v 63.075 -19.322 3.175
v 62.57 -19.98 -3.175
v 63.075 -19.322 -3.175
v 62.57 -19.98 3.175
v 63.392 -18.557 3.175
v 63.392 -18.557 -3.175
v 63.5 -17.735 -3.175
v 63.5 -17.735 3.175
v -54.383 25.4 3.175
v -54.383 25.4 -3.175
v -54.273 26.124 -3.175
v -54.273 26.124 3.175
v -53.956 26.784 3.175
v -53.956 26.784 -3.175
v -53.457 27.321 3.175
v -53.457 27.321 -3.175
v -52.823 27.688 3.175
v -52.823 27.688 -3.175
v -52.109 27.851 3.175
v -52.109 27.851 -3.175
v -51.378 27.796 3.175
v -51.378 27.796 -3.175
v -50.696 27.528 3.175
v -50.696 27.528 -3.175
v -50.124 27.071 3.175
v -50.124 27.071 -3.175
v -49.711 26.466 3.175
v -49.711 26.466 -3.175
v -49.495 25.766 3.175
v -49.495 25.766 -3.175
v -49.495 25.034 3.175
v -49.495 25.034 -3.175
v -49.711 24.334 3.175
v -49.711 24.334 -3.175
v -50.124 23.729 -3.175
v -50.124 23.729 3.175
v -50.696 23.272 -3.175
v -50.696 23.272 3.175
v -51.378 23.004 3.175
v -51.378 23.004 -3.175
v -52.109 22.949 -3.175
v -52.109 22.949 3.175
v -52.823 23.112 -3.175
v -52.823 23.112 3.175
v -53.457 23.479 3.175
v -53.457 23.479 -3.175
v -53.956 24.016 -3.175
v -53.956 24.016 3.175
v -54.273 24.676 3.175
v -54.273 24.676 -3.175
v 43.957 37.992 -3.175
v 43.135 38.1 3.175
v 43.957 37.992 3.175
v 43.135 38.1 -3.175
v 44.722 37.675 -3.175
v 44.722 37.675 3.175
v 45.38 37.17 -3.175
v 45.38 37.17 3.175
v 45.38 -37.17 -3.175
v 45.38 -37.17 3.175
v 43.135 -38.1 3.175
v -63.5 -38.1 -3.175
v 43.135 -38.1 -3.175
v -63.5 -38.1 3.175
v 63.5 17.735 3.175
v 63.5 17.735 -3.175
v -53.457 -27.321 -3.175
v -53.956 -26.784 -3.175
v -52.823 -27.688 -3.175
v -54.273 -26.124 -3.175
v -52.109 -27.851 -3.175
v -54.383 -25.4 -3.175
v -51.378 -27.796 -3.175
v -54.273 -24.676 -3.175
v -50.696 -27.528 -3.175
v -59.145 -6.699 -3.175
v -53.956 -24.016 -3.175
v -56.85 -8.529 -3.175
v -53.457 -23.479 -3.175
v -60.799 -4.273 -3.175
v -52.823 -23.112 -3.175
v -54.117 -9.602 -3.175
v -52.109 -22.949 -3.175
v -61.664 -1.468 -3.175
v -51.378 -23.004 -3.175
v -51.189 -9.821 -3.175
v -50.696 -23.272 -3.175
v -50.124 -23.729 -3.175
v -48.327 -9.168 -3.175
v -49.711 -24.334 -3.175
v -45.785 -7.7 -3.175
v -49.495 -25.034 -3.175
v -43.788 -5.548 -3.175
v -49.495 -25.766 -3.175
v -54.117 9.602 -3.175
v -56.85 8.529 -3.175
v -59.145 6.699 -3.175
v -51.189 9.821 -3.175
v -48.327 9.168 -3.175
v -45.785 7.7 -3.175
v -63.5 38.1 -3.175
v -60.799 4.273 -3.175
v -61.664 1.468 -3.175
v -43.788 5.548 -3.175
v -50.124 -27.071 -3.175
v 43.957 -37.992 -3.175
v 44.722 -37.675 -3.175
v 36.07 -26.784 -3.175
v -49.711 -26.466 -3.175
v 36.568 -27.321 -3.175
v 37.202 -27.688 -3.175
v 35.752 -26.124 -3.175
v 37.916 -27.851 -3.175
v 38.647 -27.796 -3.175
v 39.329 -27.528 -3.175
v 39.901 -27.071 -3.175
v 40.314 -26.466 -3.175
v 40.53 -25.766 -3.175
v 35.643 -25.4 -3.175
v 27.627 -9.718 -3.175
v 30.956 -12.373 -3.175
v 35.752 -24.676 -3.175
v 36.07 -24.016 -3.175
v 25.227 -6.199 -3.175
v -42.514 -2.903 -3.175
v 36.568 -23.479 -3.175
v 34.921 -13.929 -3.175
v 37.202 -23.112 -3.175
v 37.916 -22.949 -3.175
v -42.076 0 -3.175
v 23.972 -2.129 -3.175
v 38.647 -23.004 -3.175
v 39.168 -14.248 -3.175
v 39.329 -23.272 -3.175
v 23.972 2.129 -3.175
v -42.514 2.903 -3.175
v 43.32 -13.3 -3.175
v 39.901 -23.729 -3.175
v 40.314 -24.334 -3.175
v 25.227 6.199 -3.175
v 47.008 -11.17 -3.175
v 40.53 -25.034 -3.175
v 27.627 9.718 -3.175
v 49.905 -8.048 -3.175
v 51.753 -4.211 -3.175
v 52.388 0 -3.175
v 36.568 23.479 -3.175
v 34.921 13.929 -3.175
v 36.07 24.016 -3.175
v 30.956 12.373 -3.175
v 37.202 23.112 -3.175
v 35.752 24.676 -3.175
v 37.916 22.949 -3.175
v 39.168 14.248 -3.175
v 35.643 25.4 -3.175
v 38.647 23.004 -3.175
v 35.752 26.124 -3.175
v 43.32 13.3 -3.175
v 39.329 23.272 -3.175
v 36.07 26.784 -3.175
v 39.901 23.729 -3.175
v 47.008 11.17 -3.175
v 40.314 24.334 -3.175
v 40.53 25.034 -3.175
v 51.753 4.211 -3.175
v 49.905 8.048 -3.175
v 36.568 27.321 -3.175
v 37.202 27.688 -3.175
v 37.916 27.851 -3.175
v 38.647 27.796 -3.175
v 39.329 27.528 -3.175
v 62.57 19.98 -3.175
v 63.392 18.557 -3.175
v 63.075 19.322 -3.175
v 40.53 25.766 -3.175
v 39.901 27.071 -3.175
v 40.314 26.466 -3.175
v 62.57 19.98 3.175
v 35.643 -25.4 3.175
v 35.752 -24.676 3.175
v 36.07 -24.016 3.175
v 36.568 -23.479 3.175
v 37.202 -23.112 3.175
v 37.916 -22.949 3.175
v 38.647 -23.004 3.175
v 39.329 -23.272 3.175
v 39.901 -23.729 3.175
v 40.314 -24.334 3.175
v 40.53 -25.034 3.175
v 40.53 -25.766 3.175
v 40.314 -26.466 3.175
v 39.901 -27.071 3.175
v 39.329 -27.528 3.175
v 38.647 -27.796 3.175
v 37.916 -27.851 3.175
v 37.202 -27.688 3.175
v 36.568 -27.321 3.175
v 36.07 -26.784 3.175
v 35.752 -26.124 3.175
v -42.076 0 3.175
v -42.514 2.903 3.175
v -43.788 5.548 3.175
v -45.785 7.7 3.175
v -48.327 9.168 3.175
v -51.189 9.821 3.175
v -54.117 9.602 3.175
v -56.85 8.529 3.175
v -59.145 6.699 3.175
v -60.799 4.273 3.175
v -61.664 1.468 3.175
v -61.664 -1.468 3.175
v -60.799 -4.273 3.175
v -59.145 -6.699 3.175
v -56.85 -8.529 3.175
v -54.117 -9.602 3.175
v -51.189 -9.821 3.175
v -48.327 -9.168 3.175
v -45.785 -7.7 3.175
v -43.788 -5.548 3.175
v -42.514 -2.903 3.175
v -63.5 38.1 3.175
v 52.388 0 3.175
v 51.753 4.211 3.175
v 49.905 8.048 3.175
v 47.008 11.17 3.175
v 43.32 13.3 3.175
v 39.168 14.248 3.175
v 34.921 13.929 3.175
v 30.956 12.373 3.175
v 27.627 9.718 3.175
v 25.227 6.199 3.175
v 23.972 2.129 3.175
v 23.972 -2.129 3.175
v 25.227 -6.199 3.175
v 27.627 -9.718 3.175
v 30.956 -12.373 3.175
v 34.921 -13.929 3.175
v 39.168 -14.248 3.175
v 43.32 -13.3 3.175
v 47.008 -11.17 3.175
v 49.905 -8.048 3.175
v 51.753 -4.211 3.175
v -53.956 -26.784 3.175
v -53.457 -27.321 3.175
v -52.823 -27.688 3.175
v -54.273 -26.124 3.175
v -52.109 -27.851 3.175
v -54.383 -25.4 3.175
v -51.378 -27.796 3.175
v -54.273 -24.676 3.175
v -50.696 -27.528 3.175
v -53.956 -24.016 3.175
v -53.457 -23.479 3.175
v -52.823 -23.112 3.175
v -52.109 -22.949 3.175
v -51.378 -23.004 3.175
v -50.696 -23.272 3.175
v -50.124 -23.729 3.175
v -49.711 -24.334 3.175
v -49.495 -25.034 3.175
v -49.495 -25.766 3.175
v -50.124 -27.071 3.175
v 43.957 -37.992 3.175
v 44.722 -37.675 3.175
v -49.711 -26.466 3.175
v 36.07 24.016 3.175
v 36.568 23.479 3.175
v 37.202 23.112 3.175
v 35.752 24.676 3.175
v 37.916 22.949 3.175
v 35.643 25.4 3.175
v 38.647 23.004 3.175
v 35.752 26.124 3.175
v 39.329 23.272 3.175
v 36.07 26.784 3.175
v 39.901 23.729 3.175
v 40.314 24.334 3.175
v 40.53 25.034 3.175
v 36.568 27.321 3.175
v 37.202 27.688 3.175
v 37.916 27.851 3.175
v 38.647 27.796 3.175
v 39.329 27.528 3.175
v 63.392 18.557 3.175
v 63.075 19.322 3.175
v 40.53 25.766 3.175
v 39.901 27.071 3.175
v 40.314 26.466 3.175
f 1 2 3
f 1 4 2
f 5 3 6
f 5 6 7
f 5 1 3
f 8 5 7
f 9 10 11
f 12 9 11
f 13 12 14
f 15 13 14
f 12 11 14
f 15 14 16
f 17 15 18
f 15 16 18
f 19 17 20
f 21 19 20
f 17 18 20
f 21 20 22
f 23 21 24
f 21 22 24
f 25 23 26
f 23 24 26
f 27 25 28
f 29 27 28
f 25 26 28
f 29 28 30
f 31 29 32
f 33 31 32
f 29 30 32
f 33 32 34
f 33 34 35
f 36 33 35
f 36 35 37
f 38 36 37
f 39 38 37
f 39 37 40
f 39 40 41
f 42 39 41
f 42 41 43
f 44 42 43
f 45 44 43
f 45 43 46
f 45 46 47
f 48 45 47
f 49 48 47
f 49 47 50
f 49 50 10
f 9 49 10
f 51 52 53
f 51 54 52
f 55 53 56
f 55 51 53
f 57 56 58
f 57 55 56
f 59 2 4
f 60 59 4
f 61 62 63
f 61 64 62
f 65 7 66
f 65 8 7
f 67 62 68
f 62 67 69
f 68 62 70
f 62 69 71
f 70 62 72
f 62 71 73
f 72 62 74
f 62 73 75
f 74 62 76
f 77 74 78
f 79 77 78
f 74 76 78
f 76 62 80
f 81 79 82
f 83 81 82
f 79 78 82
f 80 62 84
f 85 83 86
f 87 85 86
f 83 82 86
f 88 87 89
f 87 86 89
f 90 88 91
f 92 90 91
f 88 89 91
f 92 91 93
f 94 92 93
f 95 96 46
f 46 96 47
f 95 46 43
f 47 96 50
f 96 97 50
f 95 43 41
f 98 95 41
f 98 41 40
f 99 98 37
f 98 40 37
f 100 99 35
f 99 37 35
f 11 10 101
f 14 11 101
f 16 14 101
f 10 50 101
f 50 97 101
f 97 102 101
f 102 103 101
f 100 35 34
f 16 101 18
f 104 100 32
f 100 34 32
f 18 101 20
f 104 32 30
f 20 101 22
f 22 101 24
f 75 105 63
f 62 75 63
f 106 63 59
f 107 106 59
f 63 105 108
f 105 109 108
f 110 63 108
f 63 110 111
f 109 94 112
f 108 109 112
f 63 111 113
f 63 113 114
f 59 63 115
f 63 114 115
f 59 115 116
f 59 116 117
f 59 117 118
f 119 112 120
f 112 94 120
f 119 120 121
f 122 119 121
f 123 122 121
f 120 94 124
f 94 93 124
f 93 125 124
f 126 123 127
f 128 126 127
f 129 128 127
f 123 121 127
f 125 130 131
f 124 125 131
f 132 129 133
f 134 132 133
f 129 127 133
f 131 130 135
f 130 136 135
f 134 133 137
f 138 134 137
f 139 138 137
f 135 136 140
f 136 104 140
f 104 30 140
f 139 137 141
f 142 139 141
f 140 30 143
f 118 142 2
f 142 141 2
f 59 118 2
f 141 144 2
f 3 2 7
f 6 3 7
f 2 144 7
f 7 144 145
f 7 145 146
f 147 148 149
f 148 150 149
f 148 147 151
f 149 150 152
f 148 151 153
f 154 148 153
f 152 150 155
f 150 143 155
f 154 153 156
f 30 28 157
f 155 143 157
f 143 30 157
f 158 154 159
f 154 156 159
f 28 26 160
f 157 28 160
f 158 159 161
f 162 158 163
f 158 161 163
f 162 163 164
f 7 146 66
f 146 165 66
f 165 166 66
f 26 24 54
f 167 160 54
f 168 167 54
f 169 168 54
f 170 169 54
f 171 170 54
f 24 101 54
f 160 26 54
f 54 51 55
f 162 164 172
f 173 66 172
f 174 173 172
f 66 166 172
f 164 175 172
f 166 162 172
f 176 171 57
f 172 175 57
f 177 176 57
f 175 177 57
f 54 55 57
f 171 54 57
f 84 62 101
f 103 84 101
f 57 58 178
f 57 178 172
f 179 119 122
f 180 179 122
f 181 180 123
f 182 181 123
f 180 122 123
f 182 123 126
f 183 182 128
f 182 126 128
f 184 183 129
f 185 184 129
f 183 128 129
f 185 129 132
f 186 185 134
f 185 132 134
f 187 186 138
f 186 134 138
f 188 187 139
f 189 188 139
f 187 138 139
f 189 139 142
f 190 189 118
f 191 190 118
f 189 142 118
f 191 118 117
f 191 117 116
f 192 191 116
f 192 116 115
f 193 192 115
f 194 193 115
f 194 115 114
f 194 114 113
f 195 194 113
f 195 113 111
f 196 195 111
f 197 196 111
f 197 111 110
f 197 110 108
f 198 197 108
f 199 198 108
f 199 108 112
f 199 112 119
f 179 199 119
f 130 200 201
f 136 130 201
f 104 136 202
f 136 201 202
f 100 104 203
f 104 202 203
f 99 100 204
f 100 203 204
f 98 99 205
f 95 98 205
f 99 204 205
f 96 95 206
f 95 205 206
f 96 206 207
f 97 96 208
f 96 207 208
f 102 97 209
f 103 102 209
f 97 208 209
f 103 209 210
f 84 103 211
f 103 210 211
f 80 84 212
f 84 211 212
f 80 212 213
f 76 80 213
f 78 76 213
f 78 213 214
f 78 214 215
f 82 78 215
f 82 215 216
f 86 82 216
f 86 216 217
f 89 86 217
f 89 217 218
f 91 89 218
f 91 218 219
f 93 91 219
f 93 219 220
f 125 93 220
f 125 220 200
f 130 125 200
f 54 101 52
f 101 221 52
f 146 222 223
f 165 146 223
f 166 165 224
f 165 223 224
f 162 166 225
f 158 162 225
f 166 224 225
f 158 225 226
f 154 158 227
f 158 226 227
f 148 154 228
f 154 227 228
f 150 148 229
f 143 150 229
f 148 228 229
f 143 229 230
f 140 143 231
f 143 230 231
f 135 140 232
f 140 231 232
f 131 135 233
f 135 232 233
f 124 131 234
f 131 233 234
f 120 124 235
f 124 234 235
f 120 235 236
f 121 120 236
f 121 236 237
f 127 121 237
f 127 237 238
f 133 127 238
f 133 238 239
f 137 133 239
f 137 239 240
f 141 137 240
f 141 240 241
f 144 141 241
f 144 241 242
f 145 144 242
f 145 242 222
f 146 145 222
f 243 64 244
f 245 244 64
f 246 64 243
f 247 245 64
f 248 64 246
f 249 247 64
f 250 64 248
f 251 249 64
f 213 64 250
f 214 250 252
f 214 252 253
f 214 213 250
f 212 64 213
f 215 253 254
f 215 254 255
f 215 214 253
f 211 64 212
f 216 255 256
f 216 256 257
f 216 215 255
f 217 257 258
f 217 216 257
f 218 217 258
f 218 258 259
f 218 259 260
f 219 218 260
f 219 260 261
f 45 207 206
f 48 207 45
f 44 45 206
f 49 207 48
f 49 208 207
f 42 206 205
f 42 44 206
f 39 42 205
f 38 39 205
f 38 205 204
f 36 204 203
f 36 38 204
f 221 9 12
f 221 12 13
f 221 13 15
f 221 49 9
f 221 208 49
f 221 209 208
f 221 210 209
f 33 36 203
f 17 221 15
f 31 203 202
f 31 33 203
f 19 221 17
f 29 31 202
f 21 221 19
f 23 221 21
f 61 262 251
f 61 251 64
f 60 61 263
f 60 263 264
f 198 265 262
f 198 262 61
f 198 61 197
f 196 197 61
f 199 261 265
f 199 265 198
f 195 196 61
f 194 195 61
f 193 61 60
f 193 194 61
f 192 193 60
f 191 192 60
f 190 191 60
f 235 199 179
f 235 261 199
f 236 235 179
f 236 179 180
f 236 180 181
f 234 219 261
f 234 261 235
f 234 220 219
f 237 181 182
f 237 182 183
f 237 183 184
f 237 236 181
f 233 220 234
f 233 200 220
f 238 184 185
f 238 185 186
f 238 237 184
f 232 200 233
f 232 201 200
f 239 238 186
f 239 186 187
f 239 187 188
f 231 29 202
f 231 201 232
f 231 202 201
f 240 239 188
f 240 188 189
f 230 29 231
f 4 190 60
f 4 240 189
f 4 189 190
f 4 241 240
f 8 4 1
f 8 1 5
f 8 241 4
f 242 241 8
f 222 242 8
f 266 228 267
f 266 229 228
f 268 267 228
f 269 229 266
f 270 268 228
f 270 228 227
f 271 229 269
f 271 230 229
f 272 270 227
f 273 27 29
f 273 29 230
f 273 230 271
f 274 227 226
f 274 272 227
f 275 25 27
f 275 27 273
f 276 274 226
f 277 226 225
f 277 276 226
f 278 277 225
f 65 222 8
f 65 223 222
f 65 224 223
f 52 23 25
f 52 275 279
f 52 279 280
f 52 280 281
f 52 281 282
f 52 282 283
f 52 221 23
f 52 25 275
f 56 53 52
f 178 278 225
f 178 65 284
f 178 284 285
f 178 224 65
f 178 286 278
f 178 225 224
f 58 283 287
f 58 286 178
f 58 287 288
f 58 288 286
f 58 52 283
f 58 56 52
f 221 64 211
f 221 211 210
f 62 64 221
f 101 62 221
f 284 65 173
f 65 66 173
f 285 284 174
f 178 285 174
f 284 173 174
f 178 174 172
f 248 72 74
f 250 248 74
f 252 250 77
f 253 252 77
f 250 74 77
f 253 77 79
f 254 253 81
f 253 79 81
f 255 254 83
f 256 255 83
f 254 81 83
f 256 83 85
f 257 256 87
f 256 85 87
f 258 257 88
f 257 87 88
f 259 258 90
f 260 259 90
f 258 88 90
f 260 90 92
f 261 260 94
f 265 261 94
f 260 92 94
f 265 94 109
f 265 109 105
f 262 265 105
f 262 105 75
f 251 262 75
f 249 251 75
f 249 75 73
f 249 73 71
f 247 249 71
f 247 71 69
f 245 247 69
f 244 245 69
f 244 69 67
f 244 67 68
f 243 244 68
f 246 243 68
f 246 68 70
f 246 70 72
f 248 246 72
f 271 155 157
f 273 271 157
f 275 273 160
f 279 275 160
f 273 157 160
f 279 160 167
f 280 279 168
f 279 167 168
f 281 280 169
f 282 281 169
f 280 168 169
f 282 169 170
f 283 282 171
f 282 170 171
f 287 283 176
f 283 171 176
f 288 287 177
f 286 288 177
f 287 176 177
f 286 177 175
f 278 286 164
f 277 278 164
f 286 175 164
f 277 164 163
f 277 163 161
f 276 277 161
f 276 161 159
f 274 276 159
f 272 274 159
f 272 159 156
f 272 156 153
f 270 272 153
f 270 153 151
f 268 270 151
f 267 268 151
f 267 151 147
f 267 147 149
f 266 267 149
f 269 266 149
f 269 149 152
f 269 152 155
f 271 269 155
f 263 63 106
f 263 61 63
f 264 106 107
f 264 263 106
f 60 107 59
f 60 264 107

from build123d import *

# Parameters (mm, degrees)
SKETCH1_W                    = 127
SKETCH1_H                    = 76.2
BOSS_EXTRUDE1_DEPTH          = 3.175
SKETCH2_R                    = 9.84885
SKETCH2_R_2                  = 14.2875
CUT_EXTRUDE1_DEPTH           = 75.324844433
CHAMFER1_SIZE                = 19.05
F_10_0_1935_DIAMETER_HOLE1_D = 4.9149
FILLET1_R                    = 3.175


with BuildPart() as part:
    # Sketch1 → Boss-Extrude1 (new, symmetric)
    with BuildSketch(Plane.XY):
        Rectangle(SKETCH1_W, SKETCH1_H)
    extrude(amount=BOSS_EXTRUDE1_DEPTH, both=True)

    # Sketch2 → Cut-Extrude1 (cut, through all)
    with BuildSketch(Plane.XY.offset(3.175)):
        with Locations((-51.92522, 0)):
            Circle(SKETCH2_R)
        with Locations((38.1, 0)):
            Circle(SKETCH2_R_2)
    extrude(amount=-CUT_EXTRUDE1_DEPTH, mode=Mode.SUBTRACT)

    # Chamfer1
    chamfer1_edges = [part.edges().sort_by_distance(p)[0] for p in [
        (63.5, -38.1, 0),
        (63.5, 38.1, 0),
    ]]
    chamfer(chamfer1_edges, length=CHAMFER1_SIZE)

    # #10 (0.1935) Diameter Hole1 (through all)
    with Locations(Plane.XY.offset(3.175)):
        with Locations((-51.92522, 25.4), (-51.92522, -25.4), (38.1, 25.4), (38.1, -25.4), (-51.92522, 0), (38.1, 0)):
            Hole(F_10_0_1935_DIAMETER_HOLE1_D / 2)

    # Fillet1
    fillet1_edges = [part.edges().sort_by_distance(p)[0] for p in [
        (44.45, 38.1, 0),
        (63.5, -19.05, 0),
        (63.5, 19.05, 0),
        (44.45, -38.1, 0),
    ]]
    fillet(fillet1_edges, radius=FILLET1_R)


solid = part.part
